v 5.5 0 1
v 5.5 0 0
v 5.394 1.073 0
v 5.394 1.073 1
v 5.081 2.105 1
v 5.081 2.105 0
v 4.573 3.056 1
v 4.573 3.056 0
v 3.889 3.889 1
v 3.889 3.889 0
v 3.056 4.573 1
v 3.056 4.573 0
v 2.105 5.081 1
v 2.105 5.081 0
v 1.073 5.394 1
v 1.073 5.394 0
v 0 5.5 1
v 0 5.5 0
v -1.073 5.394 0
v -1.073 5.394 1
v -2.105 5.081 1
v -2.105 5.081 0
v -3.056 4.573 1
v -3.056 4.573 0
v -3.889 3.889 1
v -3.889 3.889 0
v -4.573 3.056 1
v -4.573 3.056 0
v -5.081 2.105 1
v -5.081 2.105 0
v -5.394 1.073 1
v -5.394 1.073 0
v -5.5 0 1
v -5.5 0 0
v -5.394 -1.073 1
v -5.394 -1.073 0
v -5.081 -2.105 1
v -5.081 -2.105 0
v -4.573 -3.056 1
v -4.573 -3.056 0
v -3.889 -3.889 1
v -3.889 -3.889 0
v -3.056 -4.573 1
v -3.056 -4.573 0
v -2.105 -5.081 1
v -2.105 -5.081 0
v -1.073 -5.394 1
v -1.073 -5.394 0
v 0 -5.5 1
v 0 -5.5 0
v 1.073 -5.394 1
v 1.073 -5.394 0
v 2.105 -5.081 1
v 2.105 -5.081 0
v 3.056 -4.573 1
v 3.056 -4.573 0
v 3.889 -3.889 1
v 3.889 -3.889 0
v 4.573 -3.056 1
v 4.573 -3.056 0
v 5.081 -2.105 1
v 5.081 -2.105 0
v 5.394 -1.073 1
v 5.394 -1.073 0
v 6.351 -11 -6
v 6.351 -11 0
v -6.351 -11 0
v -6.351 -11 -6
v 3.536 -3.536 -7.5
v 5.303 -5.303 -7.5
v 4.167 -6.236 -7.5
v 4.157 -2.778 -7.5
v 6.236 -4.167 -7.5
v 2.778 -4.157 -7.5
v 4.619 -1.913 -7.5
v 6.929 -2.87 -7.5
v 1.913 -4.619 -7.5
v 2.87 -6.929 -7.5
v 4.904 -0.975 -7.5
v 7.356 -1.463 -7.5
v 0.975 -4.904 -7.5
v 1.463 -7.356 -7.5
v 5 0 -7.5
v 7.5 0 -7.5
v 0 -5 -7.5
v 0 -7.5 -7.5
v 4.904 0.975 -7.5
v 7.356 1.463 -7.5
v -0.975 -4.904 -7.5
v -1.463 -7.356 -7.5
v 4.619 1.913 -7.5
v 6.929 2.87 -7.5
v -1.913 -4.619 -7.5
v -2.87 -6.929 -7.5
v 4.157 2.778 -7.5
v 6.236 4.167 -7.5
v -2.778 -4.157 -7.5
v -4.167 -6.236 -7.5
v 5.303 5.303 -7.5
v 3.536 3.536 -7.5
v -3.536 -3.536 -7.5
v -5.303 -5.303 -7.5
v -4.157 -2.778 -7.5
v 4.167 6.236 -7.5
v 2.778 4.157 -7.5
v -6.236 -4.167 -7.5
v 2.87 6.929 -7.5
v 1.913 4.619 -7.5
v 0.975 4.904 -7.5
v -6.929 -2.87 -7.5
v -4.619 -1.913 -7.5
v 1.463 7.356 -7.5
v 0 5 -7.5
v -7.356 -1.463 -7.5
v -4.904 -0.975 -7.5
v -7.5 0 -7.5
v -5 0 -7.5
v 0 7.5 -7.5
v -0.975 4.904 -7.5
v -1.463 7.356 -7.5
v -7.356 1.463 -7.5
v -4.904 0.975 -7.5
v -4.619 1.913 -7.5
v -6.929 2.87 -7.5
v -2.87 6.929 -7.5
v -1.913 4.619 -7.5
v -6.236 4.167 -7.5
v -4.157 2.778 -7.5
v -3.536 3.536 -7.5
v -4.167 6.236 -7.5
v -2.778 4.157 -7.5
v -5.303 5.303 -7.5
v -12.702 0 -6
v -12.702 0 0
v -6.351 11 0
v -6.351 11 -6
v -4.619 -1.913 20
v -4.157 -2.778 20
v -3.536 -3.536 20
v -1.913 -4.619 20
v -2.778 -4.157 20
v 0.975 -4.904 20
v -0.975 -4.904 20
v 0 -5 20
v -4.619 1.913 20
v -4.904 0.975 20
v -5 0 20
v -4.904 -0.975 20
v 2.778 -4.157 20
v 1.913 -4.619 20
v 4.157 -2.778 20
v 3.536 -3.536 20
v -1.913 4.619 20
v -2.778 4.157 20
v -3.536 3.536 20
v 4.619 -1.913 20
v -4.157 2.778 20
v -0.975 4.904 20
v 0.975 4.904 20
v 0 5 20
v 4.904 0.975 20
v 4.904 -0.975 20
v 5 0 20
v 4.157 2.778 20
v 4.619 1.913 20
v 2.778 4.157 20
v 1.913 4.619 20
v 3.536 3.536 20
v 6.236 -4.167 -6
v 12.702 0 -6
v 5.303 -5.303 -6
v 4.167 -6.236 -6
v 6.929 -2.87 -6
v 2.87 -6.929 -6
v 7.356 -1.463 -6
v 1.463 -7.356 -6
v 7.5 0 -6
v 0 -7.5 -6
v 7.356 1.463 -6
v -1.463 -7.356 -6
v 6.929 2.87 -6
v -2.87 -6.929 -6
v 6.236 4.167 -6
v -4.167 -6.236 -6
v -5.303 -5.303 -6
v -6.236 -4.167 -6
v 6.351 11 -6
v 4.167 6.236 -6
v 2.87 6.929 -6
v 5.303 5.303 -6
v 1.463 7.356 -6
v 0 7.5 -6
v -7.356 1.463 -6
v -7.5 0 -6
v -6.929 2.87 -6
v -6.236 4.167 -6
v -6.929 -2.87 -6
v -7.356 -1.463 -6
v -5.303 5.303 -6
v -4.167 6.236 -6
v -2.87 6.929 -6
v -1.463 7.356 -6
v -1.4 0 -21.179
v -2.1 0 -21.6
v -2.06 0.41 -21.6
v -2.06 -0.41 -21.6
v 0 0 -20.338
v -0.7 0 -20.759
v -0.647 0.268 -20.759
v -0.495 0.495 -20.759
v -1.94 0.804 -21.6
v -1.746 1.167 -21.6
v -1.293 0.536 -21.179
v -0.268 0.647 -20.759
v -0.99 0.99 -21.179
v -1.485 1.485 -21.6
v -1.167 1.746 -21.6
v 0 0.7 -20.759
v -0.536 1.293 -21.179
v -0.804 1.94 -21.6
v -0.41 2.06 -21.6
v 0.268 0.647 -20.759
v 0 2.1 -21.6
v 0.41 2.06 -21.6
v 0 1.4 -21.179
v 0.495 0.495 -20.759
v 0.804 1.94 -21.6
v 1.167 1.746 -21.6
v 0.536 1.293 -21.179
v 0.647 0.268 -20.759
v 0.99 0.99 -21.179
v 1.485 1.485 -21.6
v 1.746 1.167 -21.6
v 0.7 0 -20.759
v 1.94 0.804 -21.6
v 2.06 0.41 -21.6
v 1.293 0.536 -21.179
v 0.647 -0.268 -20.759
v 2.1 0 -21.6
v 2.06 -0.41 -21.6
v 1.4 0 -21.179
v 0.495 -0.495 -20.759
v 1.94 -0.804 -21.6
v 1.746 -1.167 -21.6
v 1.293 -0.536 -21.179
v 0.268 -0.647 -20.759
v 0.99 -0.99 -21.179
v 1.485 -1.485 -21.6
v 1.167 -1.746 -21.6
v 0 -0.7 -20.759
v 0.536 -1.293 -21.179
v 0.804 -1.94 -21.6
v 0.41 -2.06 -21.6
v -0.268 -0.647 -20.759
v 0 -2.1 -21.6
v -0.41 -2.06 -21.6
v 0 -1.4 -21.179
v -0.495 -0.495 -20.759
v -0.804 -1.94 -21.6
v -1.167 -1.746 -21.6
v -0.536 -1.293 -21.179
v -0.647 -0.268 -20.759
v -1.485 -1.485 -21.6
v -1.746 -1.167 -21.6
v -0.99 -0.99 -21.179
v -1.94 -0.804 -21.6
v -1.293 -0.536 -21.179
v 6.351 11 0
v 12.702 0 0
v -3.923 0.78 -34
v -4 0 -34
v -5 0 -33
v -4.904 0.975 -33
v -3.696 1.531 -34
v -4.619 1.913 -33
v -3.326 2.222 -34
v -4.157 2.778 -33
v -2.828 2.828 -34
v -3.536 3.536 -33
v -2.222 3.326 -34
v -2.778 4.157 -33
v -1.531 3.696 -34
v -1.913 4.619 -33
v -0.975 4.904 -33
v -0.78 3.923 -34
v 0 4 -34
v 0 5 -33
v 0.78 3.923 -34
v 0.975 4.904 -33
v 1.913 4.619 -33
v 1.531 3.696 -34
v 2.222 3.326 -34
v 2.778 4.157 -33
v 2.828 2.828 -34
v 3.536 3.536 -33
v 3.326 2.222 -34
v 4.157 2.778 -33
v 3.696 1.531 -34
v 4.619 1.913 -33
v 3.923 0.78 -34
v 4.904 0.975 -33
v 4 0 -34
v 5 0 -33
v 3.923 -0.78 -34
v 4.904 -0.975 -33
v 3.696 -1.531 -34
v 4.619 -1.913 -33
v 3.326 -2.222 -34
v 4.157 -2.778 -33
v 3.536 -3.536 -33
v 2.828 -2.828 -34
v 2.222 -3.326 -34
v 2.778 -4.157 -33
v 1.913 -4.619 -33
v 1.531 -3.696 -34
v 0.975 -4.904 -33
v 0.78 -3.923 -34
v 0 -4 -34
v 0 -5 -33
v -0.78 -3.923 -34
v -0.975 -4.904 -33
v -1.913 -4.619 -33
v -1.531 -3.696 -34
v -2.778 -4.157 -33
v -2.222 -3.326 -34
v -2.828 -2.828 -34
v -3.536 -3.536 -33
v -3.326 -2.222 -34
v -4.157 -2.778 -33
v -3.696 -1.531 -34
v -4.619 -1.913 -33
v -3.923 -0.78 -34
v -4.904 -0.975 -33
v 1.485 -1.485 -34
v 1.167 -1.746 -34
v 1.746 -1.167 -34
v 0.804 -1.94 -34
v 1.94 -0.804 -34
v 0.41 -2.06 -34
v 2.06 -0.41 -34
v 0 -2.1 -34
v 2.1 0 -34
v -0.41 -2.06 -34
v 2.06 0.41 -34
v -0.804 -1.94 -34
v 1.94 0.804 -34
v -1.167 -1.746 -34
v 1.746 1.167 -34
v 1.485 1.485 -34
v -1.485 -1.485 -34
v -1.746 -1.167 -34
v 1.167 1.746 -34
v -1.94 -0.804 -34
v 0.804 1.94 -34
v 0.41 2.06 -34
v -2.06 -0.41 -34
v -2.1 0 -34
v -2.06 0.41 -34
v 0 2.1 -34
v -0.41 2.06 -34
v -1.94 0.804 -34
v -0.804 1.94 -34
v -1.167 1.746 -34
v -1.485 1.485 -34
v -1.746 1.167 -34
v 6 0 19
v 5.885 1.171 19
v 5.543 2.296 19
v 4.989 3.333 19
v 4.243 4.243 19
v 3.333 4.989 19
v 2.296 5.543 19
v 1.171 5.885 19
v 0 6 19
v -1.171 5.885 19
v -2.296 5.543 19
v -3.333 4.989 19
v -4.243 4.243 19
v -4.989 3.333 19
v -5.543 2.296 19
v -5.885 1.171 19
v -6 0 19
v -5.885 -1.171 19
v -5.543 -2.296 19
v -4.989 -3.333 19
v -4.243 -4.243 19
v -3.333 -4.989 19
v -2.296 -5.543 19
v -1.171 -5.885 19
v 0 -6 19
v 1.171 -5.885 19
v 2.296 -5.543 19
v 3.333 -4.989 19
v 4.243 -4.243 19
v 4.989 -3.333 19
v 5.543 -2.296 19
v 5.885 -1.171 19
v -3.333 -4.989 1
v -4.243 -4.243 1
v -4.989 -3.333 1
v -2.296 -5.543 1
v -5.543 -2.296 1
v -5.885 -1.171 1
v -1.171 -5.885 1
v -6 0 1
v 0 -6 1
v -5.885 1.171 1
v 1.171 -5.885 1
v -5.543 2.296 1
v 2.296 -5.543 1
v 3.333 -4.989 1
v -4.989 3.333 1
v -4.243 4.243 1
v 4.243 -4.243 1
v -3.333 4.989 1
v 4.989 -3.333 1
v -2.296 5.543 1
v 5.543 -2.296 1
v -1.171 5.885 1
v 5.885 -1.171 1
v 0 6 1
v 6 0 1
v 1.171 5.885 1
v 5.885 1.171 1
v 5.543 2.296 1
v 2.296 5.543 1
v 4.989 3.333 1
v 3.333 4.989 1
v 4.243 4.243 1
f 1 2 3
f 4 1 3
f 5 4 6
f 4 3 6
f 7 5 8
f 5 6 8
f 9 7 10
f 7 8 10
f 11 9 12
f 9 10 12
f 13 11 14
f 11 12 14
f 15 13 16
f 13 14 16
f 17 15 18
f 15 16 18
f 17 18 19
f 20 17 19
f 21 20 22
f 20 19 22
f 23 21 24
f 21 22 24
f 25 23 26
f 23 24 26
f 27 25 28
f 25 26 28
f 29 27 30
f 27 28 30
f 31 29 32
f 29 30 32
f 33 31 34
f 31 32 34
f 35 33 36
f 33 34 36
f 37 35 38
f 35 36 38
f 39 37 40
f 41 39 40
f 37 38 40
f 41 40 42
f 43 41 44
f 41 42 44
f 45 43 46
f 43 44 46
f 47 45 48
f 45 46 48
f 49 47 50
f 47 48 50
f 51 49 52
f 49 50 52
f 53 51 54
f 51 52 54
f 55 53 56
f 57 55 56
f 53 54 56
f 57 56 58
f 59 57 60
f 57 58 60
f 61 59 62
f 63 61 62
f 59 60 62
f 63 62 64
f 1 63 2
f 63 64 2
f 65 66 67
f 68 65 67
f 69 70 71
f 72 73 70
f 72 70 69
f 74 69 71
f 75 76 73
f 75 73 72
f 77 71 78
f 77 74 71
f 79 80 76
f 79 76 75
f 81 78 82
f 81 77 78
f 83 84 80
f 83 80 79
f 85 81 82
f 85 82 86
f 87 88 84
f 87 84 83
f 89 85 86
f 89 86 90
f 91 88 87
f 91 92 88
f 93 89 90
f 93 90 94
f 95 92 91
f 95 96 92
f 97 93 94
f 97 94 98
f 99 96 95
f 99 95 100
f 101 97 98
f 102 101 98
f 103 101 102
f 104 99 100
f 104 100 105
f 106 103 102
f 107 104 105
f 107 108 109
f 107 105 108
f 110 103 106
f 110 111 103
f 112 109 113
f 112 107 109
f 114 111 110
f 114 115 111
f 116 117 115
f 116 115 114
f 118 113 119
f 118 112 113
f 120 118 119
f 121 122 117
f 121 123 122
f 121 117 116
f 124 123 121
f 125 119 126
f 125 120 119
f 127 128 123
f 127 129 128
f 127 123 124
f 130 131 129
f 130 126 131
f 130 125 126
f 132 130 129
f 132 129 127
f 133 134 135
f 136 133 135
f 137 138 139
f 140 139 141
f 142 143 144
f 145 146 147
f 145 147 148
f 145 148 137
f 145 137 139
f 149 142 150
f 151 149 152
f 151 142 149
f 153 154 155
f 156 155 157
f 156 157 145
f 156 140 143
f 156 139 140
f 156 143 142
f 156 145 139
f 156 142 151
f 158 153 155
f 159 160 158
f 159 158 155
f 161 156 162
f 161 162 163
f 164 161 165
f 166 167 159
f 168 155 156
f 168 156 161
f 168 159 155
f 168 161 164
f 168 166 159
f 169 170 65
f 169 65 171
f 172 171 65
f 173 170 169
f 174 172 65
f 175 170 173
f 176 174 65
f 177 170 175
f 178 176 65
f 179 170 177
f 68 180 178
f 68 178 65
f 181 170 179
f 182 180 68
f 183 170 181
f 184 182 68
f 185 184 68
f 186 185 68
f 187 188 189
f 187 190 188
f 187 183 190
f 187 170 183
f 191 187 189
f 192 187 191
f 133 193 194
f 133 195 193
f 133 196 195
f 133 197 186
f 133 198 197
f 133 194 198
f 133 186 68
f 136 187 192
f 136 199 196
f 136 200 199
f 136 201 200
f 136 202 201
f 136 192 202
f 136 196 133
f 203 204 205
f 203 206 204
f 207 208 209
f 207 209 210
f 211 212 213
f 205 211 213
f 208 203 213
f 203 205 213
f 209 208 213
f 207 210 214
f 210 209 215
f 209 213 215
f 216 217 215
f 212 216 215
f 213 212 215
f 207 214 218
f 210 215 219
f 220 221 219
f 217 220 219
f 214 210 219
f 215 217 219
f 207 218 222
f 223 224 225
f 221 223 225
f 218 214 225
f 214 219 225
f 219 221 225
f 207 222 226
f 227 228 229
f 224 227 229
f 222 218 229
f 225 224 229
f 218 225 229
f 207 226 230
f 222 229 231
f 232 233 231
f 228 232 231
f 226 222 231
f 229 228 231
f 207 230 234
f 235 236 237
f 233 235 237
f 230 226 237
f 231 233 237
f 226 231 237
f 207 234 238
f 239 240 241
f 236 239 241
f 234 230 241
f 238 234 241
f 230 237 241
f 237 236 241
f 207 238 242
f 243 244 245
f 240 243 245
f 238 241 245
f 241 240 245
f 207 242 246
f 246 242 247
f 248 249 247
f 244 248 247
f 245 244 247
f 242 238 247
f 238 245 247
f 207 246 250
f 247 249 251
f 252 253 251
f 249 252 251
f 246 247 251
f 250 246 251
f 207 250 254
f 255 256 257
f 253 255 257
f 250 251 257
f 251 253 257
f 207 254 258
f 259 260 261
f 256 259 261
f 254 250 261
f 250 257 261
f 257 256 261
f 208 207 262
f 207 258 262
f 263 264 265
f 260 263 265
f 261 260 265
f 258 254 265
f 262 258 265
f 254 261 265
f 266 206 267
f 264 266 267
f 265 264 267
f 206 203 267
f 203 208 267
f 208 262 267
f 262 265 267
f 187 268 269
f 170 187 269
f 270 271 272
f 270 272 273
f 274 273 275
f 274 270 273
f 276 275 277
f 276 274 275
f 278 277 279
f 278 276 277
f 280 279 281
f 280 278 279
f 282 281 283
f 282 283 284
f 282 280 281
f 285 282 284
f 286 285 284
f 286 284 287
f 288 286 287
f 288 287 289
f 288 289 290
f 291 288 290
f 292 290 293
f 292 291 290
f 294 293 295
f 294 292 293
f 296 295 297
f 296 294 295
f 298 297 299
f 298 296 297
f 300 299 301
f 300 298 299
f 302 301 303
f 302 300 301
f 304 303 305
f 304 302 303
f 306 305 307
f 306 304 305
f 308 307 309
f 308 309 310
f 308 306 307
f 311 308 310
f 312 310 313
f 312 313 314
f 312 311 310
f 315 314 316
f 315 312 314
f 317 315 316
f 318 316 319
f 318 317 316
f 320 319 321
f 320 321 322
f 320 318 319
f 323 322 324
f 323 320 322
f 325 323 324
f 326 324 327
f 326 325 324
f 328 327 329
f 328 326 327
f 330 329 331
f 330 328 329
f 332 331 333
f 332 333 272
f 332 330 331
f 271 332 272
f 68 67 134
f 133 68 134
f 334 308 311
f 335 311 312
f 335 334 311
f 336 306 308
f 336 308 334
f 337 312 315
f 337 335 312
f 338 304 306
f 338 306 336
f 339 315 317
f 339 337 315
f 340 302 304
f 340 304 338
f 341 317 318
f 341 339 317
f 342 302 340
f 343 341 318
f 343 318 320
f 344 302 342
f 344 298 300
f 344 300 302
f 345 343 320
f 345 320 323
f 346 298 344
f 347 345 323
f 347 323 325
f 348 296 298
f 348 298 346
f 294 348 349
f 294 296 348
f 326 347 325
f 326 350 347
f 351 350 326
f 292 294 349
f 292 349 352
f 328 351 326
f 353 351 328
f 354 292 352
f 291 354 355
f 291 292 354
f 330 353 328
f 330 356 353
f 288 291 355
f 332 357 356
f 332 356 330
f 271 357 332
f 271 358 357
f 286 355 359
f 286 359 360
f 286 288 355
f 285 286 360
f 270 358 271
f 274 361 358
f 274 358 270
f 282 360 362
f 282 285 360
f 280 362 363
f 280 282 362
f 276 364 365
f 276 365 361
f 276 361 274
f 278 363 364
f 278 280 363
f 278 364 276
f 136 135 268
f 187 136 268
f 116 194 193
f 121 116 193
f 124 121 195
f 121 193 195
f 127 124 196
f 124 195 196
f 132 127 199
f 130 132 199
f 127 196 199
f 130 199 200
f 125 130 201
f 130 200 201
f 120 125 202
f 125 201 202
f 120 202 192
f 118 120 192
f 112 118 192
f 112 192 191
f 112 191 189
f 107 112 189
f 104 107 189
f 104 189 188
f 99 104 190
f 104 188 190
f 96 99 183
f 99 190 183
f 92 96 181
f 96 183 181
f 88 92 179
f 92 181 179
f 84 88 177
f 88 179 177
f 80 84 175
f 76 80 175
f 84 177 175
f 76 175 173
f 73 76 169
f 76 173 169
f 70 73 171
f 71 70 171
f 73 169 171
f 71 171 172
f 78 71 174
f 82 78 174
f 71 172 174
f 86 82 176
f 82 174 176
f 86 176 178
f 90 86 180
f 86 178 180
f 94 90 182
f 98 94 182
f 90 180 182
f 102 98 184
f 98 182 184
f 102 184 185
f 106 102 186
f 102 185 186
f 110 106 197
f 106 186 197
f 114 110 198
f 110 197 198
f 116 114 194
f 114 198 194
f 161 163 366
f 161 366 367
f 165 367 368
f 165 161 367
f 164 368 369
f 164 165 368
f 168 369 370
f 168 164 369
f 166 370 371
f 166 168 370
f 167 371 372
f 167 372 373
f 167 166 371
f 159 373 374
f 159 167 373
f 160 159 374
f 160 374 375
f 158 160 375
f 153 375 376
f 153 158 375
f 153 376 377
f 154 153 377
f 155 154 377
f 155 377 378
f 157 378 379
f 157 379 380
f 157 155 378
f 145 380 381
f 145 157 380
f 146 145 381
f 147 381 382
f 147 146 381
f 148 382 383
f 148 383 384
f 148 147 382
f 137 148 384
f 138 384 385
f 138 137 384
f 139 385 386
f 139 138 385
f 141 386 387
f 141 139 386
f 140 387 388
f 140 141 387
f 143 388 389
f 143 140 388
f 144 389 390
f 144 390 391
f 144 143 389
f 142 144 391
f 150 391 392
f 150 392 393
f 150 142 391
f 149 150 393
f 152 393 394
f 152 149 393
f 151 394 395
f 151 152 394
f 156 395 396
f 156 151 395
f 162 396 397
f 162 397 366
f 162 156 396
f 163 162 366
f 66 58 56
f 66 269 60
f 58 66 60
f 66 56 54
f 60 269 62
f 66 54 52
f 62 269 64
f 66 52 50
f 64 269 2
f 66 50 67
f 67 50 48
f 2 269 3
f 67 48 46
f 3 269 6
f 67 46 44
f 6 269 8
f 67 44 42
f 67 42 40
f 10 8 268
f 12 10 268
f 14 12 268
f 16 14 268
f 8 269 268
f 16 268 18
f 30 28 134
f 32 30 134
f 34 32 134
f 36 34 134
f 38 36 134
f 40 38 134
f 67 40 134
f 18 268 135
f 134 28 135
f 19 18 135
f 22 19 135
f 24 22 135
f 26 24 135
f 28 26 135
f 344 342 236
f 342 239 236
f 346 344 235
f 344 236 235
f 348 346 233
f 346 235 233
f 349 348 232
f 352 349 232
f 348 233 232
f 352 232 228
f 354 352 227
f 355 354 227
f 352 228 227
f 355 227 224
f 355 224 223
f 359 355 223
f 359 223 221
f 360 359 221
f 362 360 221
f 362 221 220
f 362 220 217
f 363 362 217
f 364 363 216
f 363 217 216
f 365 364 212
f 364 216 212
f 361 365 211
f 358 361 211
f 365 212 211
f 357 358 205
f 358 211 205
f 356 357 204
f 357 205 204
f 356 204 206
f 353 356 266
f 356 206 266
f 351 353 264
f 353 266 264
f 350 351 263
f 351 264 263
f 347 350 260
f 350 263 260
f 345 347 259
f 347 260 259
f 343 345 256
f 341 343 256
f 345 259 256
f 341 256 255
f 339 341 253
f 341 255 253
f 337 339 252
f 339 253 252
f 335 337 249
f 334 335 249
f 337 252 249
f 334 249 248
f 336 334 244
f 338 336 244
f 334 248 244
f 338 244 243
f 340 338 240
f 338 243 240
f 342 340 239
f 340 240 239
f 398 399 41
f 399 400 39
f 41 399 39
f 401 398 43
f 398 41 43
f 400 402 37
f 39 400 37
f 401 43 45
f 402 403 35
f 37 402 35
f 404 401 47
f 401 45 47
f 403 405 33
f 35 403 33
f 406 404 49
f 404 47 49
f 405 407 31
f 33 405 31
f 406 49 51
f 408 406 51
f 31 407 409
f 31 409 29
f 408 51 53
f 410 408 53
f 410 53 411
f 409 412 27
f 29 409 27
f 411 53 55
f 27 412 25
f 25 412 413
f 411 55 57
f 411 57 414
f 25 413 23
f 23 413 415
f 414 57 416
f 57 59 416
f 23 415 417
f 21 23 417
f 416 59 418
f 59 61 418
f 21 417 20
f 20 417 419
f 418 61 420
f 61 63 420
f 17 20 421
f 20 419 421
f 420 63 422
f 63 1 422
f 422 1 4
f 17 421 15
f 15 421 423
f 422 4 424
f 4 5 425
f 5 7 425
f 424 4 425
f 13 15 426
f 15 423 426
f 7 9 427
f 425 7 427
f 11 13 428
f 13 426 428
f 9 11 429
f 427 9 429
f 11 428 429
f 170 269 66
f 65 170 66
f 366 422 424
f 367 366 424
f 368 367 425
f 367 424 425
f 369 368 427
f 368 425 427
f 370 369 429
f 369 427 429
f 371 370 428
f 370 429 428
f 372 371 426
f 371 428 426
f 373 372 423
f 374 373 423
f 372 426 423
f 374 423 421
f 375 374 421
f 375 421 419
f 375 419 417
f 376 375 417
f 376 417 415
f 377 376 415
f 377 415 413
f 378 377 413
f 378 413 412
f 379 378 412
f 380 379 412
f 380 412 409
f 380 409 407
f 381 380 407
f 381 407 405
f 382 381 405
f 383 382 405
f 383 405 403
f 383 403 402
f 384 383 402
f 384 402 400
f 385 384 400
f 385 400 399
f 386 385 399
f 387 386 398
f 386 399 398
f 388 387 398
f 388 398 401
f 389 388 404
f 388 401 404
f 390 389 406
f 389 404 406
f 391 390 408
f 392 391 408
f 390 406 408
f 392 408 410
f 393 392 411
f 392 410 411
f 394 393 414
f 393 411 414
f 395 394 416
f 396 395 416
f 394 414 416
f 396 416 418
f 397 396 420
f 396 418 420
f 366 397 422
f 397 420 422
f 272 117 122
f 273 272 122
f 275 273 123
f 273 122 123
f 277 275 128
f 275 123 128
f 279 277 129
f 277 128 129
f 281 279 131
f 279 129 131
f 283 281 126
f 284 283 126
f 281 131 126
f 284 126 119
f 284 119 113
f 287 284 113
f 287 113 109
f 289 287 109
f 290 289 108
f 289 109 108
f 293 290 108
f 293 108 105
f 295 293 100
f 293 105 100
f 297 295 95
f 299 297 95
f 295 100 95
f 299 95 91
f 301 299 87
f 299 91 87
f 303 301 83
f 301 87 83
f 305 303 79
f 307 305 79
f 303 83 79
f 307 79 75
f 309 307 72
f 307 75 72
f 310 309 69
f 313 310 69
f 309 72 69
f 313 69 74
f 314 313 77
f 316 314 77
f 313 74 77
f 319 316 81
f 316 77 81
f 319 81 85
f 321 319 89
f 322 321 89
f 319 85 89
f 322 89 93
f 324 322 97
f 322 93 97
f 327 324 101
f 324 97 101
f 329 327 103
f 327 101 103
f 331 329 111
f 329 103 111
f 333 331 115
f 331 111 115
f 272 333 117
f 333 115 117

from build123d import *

# Parameters (mm, degrees)
SKETCH_1_R          = 6
EXTRUDE_1_DEPTH     = 20
EXTRUDE_2_DEPTH     = 6
SKETCH_3_R          = 7.5
EXTRUDE_3_DEPTH     = 1.5
SKETCH_4_R          = 5
EXTRUDE_4_DEPTH     = 26.5
SKETCH_6_R          = 6
SKETCH_6_R_2        = 5.5
CUT_EXTRUDE_1_DEPTH = 1
M5X0_8_1_D          = 4.2
M5X0_8_1_DEPTH      = 12.4
M5X0_8_1_TIP        = 1.2618073
CHAMFER_1_SIZE      = 1


with BuildPart() as part:
    # 草图1 → 凸台-拉伸1 (new body)
    with BuildSketch(Plane.XY):
        Circle(SKETCH_1_R)
    extrude(amount=EXTRUDE_1_DEPTH)

    # 草图2 → 凸台-拉伸2 (add)
    with BuildSketch(Plane(origin=(0, 0, 0), x_dir=(-1, 0, 0), z_dir=(0, 0, -1))):
        Polygon((6.350852961, 11), (-6.350852961, 11), (-12.701705922, 0), (-6.350852961, -11), (6.350852961, -11), (12.701705922, 0), align=None)
    extrude(amount=EXTRUDE_2_DEPTH)

    # 草图3 → 凸台-拉伸3 (add)
    with BuildSketch(Plane(origin=(0, 0, -6), x_dir=(-1, 0, 0), z_dir=(0, 0, -1))):
        Circle(SKETCH_3_R)
    extrude(amount=EXTRUDE_3_DEPTH)

    # 草图4 → 凸台-拉伸4 (add)
    with BuildSketch(Plane(origin=(0, 0, -7.5), x_dir=(-1, 0, 0), z_dir=(0, 0, -1))):
        Circle(SKETCH_4_R)
    extrude(amount=EXTRUDE_4_DEPTH)

    # 草图6 → 切除-拉伸1 (cut)
    with BuildSketch(Plane.XY):
        Circle(SKETCH_6_R)
        Circle(SKETCH_6_R_2, mode=Mode.SUBTRACT)
    extrude(amount=CUT_EXTRUDE_1_DEPTH, mode=Mode.SUBTRACT)

    # M5x0.8 螺纹孔1
    with Locations(Plane(origin=(0, 0, -34), x_dir=(-1, 0, 0), z_dir=(0, 0, -1))):
        with Locations((0, 0)):
            Hole(M5X0_8_1_D / 2, depth=M5X0_8_1_DEPTH)
            with Locations((0, 0, -(M5X0_8_1_DEPTH + M5X0_8_1_TIP / 2))):  # 118° drill point
                Cone(0, M5X0_8_1_D / 2, M5X0_8_1_TIP, mode=Mode.SUBTRACT)

    # 倒角1
    chamfer_1_edges = [part.edges().sort_by_distance(p)[0] for p in [
        (5, 0, -34),
        (-6, 0, 20),
    ]]
    chamfer(chamfer_1_edges, length=CHAMFER_1_SIZE)


solid = part.part
